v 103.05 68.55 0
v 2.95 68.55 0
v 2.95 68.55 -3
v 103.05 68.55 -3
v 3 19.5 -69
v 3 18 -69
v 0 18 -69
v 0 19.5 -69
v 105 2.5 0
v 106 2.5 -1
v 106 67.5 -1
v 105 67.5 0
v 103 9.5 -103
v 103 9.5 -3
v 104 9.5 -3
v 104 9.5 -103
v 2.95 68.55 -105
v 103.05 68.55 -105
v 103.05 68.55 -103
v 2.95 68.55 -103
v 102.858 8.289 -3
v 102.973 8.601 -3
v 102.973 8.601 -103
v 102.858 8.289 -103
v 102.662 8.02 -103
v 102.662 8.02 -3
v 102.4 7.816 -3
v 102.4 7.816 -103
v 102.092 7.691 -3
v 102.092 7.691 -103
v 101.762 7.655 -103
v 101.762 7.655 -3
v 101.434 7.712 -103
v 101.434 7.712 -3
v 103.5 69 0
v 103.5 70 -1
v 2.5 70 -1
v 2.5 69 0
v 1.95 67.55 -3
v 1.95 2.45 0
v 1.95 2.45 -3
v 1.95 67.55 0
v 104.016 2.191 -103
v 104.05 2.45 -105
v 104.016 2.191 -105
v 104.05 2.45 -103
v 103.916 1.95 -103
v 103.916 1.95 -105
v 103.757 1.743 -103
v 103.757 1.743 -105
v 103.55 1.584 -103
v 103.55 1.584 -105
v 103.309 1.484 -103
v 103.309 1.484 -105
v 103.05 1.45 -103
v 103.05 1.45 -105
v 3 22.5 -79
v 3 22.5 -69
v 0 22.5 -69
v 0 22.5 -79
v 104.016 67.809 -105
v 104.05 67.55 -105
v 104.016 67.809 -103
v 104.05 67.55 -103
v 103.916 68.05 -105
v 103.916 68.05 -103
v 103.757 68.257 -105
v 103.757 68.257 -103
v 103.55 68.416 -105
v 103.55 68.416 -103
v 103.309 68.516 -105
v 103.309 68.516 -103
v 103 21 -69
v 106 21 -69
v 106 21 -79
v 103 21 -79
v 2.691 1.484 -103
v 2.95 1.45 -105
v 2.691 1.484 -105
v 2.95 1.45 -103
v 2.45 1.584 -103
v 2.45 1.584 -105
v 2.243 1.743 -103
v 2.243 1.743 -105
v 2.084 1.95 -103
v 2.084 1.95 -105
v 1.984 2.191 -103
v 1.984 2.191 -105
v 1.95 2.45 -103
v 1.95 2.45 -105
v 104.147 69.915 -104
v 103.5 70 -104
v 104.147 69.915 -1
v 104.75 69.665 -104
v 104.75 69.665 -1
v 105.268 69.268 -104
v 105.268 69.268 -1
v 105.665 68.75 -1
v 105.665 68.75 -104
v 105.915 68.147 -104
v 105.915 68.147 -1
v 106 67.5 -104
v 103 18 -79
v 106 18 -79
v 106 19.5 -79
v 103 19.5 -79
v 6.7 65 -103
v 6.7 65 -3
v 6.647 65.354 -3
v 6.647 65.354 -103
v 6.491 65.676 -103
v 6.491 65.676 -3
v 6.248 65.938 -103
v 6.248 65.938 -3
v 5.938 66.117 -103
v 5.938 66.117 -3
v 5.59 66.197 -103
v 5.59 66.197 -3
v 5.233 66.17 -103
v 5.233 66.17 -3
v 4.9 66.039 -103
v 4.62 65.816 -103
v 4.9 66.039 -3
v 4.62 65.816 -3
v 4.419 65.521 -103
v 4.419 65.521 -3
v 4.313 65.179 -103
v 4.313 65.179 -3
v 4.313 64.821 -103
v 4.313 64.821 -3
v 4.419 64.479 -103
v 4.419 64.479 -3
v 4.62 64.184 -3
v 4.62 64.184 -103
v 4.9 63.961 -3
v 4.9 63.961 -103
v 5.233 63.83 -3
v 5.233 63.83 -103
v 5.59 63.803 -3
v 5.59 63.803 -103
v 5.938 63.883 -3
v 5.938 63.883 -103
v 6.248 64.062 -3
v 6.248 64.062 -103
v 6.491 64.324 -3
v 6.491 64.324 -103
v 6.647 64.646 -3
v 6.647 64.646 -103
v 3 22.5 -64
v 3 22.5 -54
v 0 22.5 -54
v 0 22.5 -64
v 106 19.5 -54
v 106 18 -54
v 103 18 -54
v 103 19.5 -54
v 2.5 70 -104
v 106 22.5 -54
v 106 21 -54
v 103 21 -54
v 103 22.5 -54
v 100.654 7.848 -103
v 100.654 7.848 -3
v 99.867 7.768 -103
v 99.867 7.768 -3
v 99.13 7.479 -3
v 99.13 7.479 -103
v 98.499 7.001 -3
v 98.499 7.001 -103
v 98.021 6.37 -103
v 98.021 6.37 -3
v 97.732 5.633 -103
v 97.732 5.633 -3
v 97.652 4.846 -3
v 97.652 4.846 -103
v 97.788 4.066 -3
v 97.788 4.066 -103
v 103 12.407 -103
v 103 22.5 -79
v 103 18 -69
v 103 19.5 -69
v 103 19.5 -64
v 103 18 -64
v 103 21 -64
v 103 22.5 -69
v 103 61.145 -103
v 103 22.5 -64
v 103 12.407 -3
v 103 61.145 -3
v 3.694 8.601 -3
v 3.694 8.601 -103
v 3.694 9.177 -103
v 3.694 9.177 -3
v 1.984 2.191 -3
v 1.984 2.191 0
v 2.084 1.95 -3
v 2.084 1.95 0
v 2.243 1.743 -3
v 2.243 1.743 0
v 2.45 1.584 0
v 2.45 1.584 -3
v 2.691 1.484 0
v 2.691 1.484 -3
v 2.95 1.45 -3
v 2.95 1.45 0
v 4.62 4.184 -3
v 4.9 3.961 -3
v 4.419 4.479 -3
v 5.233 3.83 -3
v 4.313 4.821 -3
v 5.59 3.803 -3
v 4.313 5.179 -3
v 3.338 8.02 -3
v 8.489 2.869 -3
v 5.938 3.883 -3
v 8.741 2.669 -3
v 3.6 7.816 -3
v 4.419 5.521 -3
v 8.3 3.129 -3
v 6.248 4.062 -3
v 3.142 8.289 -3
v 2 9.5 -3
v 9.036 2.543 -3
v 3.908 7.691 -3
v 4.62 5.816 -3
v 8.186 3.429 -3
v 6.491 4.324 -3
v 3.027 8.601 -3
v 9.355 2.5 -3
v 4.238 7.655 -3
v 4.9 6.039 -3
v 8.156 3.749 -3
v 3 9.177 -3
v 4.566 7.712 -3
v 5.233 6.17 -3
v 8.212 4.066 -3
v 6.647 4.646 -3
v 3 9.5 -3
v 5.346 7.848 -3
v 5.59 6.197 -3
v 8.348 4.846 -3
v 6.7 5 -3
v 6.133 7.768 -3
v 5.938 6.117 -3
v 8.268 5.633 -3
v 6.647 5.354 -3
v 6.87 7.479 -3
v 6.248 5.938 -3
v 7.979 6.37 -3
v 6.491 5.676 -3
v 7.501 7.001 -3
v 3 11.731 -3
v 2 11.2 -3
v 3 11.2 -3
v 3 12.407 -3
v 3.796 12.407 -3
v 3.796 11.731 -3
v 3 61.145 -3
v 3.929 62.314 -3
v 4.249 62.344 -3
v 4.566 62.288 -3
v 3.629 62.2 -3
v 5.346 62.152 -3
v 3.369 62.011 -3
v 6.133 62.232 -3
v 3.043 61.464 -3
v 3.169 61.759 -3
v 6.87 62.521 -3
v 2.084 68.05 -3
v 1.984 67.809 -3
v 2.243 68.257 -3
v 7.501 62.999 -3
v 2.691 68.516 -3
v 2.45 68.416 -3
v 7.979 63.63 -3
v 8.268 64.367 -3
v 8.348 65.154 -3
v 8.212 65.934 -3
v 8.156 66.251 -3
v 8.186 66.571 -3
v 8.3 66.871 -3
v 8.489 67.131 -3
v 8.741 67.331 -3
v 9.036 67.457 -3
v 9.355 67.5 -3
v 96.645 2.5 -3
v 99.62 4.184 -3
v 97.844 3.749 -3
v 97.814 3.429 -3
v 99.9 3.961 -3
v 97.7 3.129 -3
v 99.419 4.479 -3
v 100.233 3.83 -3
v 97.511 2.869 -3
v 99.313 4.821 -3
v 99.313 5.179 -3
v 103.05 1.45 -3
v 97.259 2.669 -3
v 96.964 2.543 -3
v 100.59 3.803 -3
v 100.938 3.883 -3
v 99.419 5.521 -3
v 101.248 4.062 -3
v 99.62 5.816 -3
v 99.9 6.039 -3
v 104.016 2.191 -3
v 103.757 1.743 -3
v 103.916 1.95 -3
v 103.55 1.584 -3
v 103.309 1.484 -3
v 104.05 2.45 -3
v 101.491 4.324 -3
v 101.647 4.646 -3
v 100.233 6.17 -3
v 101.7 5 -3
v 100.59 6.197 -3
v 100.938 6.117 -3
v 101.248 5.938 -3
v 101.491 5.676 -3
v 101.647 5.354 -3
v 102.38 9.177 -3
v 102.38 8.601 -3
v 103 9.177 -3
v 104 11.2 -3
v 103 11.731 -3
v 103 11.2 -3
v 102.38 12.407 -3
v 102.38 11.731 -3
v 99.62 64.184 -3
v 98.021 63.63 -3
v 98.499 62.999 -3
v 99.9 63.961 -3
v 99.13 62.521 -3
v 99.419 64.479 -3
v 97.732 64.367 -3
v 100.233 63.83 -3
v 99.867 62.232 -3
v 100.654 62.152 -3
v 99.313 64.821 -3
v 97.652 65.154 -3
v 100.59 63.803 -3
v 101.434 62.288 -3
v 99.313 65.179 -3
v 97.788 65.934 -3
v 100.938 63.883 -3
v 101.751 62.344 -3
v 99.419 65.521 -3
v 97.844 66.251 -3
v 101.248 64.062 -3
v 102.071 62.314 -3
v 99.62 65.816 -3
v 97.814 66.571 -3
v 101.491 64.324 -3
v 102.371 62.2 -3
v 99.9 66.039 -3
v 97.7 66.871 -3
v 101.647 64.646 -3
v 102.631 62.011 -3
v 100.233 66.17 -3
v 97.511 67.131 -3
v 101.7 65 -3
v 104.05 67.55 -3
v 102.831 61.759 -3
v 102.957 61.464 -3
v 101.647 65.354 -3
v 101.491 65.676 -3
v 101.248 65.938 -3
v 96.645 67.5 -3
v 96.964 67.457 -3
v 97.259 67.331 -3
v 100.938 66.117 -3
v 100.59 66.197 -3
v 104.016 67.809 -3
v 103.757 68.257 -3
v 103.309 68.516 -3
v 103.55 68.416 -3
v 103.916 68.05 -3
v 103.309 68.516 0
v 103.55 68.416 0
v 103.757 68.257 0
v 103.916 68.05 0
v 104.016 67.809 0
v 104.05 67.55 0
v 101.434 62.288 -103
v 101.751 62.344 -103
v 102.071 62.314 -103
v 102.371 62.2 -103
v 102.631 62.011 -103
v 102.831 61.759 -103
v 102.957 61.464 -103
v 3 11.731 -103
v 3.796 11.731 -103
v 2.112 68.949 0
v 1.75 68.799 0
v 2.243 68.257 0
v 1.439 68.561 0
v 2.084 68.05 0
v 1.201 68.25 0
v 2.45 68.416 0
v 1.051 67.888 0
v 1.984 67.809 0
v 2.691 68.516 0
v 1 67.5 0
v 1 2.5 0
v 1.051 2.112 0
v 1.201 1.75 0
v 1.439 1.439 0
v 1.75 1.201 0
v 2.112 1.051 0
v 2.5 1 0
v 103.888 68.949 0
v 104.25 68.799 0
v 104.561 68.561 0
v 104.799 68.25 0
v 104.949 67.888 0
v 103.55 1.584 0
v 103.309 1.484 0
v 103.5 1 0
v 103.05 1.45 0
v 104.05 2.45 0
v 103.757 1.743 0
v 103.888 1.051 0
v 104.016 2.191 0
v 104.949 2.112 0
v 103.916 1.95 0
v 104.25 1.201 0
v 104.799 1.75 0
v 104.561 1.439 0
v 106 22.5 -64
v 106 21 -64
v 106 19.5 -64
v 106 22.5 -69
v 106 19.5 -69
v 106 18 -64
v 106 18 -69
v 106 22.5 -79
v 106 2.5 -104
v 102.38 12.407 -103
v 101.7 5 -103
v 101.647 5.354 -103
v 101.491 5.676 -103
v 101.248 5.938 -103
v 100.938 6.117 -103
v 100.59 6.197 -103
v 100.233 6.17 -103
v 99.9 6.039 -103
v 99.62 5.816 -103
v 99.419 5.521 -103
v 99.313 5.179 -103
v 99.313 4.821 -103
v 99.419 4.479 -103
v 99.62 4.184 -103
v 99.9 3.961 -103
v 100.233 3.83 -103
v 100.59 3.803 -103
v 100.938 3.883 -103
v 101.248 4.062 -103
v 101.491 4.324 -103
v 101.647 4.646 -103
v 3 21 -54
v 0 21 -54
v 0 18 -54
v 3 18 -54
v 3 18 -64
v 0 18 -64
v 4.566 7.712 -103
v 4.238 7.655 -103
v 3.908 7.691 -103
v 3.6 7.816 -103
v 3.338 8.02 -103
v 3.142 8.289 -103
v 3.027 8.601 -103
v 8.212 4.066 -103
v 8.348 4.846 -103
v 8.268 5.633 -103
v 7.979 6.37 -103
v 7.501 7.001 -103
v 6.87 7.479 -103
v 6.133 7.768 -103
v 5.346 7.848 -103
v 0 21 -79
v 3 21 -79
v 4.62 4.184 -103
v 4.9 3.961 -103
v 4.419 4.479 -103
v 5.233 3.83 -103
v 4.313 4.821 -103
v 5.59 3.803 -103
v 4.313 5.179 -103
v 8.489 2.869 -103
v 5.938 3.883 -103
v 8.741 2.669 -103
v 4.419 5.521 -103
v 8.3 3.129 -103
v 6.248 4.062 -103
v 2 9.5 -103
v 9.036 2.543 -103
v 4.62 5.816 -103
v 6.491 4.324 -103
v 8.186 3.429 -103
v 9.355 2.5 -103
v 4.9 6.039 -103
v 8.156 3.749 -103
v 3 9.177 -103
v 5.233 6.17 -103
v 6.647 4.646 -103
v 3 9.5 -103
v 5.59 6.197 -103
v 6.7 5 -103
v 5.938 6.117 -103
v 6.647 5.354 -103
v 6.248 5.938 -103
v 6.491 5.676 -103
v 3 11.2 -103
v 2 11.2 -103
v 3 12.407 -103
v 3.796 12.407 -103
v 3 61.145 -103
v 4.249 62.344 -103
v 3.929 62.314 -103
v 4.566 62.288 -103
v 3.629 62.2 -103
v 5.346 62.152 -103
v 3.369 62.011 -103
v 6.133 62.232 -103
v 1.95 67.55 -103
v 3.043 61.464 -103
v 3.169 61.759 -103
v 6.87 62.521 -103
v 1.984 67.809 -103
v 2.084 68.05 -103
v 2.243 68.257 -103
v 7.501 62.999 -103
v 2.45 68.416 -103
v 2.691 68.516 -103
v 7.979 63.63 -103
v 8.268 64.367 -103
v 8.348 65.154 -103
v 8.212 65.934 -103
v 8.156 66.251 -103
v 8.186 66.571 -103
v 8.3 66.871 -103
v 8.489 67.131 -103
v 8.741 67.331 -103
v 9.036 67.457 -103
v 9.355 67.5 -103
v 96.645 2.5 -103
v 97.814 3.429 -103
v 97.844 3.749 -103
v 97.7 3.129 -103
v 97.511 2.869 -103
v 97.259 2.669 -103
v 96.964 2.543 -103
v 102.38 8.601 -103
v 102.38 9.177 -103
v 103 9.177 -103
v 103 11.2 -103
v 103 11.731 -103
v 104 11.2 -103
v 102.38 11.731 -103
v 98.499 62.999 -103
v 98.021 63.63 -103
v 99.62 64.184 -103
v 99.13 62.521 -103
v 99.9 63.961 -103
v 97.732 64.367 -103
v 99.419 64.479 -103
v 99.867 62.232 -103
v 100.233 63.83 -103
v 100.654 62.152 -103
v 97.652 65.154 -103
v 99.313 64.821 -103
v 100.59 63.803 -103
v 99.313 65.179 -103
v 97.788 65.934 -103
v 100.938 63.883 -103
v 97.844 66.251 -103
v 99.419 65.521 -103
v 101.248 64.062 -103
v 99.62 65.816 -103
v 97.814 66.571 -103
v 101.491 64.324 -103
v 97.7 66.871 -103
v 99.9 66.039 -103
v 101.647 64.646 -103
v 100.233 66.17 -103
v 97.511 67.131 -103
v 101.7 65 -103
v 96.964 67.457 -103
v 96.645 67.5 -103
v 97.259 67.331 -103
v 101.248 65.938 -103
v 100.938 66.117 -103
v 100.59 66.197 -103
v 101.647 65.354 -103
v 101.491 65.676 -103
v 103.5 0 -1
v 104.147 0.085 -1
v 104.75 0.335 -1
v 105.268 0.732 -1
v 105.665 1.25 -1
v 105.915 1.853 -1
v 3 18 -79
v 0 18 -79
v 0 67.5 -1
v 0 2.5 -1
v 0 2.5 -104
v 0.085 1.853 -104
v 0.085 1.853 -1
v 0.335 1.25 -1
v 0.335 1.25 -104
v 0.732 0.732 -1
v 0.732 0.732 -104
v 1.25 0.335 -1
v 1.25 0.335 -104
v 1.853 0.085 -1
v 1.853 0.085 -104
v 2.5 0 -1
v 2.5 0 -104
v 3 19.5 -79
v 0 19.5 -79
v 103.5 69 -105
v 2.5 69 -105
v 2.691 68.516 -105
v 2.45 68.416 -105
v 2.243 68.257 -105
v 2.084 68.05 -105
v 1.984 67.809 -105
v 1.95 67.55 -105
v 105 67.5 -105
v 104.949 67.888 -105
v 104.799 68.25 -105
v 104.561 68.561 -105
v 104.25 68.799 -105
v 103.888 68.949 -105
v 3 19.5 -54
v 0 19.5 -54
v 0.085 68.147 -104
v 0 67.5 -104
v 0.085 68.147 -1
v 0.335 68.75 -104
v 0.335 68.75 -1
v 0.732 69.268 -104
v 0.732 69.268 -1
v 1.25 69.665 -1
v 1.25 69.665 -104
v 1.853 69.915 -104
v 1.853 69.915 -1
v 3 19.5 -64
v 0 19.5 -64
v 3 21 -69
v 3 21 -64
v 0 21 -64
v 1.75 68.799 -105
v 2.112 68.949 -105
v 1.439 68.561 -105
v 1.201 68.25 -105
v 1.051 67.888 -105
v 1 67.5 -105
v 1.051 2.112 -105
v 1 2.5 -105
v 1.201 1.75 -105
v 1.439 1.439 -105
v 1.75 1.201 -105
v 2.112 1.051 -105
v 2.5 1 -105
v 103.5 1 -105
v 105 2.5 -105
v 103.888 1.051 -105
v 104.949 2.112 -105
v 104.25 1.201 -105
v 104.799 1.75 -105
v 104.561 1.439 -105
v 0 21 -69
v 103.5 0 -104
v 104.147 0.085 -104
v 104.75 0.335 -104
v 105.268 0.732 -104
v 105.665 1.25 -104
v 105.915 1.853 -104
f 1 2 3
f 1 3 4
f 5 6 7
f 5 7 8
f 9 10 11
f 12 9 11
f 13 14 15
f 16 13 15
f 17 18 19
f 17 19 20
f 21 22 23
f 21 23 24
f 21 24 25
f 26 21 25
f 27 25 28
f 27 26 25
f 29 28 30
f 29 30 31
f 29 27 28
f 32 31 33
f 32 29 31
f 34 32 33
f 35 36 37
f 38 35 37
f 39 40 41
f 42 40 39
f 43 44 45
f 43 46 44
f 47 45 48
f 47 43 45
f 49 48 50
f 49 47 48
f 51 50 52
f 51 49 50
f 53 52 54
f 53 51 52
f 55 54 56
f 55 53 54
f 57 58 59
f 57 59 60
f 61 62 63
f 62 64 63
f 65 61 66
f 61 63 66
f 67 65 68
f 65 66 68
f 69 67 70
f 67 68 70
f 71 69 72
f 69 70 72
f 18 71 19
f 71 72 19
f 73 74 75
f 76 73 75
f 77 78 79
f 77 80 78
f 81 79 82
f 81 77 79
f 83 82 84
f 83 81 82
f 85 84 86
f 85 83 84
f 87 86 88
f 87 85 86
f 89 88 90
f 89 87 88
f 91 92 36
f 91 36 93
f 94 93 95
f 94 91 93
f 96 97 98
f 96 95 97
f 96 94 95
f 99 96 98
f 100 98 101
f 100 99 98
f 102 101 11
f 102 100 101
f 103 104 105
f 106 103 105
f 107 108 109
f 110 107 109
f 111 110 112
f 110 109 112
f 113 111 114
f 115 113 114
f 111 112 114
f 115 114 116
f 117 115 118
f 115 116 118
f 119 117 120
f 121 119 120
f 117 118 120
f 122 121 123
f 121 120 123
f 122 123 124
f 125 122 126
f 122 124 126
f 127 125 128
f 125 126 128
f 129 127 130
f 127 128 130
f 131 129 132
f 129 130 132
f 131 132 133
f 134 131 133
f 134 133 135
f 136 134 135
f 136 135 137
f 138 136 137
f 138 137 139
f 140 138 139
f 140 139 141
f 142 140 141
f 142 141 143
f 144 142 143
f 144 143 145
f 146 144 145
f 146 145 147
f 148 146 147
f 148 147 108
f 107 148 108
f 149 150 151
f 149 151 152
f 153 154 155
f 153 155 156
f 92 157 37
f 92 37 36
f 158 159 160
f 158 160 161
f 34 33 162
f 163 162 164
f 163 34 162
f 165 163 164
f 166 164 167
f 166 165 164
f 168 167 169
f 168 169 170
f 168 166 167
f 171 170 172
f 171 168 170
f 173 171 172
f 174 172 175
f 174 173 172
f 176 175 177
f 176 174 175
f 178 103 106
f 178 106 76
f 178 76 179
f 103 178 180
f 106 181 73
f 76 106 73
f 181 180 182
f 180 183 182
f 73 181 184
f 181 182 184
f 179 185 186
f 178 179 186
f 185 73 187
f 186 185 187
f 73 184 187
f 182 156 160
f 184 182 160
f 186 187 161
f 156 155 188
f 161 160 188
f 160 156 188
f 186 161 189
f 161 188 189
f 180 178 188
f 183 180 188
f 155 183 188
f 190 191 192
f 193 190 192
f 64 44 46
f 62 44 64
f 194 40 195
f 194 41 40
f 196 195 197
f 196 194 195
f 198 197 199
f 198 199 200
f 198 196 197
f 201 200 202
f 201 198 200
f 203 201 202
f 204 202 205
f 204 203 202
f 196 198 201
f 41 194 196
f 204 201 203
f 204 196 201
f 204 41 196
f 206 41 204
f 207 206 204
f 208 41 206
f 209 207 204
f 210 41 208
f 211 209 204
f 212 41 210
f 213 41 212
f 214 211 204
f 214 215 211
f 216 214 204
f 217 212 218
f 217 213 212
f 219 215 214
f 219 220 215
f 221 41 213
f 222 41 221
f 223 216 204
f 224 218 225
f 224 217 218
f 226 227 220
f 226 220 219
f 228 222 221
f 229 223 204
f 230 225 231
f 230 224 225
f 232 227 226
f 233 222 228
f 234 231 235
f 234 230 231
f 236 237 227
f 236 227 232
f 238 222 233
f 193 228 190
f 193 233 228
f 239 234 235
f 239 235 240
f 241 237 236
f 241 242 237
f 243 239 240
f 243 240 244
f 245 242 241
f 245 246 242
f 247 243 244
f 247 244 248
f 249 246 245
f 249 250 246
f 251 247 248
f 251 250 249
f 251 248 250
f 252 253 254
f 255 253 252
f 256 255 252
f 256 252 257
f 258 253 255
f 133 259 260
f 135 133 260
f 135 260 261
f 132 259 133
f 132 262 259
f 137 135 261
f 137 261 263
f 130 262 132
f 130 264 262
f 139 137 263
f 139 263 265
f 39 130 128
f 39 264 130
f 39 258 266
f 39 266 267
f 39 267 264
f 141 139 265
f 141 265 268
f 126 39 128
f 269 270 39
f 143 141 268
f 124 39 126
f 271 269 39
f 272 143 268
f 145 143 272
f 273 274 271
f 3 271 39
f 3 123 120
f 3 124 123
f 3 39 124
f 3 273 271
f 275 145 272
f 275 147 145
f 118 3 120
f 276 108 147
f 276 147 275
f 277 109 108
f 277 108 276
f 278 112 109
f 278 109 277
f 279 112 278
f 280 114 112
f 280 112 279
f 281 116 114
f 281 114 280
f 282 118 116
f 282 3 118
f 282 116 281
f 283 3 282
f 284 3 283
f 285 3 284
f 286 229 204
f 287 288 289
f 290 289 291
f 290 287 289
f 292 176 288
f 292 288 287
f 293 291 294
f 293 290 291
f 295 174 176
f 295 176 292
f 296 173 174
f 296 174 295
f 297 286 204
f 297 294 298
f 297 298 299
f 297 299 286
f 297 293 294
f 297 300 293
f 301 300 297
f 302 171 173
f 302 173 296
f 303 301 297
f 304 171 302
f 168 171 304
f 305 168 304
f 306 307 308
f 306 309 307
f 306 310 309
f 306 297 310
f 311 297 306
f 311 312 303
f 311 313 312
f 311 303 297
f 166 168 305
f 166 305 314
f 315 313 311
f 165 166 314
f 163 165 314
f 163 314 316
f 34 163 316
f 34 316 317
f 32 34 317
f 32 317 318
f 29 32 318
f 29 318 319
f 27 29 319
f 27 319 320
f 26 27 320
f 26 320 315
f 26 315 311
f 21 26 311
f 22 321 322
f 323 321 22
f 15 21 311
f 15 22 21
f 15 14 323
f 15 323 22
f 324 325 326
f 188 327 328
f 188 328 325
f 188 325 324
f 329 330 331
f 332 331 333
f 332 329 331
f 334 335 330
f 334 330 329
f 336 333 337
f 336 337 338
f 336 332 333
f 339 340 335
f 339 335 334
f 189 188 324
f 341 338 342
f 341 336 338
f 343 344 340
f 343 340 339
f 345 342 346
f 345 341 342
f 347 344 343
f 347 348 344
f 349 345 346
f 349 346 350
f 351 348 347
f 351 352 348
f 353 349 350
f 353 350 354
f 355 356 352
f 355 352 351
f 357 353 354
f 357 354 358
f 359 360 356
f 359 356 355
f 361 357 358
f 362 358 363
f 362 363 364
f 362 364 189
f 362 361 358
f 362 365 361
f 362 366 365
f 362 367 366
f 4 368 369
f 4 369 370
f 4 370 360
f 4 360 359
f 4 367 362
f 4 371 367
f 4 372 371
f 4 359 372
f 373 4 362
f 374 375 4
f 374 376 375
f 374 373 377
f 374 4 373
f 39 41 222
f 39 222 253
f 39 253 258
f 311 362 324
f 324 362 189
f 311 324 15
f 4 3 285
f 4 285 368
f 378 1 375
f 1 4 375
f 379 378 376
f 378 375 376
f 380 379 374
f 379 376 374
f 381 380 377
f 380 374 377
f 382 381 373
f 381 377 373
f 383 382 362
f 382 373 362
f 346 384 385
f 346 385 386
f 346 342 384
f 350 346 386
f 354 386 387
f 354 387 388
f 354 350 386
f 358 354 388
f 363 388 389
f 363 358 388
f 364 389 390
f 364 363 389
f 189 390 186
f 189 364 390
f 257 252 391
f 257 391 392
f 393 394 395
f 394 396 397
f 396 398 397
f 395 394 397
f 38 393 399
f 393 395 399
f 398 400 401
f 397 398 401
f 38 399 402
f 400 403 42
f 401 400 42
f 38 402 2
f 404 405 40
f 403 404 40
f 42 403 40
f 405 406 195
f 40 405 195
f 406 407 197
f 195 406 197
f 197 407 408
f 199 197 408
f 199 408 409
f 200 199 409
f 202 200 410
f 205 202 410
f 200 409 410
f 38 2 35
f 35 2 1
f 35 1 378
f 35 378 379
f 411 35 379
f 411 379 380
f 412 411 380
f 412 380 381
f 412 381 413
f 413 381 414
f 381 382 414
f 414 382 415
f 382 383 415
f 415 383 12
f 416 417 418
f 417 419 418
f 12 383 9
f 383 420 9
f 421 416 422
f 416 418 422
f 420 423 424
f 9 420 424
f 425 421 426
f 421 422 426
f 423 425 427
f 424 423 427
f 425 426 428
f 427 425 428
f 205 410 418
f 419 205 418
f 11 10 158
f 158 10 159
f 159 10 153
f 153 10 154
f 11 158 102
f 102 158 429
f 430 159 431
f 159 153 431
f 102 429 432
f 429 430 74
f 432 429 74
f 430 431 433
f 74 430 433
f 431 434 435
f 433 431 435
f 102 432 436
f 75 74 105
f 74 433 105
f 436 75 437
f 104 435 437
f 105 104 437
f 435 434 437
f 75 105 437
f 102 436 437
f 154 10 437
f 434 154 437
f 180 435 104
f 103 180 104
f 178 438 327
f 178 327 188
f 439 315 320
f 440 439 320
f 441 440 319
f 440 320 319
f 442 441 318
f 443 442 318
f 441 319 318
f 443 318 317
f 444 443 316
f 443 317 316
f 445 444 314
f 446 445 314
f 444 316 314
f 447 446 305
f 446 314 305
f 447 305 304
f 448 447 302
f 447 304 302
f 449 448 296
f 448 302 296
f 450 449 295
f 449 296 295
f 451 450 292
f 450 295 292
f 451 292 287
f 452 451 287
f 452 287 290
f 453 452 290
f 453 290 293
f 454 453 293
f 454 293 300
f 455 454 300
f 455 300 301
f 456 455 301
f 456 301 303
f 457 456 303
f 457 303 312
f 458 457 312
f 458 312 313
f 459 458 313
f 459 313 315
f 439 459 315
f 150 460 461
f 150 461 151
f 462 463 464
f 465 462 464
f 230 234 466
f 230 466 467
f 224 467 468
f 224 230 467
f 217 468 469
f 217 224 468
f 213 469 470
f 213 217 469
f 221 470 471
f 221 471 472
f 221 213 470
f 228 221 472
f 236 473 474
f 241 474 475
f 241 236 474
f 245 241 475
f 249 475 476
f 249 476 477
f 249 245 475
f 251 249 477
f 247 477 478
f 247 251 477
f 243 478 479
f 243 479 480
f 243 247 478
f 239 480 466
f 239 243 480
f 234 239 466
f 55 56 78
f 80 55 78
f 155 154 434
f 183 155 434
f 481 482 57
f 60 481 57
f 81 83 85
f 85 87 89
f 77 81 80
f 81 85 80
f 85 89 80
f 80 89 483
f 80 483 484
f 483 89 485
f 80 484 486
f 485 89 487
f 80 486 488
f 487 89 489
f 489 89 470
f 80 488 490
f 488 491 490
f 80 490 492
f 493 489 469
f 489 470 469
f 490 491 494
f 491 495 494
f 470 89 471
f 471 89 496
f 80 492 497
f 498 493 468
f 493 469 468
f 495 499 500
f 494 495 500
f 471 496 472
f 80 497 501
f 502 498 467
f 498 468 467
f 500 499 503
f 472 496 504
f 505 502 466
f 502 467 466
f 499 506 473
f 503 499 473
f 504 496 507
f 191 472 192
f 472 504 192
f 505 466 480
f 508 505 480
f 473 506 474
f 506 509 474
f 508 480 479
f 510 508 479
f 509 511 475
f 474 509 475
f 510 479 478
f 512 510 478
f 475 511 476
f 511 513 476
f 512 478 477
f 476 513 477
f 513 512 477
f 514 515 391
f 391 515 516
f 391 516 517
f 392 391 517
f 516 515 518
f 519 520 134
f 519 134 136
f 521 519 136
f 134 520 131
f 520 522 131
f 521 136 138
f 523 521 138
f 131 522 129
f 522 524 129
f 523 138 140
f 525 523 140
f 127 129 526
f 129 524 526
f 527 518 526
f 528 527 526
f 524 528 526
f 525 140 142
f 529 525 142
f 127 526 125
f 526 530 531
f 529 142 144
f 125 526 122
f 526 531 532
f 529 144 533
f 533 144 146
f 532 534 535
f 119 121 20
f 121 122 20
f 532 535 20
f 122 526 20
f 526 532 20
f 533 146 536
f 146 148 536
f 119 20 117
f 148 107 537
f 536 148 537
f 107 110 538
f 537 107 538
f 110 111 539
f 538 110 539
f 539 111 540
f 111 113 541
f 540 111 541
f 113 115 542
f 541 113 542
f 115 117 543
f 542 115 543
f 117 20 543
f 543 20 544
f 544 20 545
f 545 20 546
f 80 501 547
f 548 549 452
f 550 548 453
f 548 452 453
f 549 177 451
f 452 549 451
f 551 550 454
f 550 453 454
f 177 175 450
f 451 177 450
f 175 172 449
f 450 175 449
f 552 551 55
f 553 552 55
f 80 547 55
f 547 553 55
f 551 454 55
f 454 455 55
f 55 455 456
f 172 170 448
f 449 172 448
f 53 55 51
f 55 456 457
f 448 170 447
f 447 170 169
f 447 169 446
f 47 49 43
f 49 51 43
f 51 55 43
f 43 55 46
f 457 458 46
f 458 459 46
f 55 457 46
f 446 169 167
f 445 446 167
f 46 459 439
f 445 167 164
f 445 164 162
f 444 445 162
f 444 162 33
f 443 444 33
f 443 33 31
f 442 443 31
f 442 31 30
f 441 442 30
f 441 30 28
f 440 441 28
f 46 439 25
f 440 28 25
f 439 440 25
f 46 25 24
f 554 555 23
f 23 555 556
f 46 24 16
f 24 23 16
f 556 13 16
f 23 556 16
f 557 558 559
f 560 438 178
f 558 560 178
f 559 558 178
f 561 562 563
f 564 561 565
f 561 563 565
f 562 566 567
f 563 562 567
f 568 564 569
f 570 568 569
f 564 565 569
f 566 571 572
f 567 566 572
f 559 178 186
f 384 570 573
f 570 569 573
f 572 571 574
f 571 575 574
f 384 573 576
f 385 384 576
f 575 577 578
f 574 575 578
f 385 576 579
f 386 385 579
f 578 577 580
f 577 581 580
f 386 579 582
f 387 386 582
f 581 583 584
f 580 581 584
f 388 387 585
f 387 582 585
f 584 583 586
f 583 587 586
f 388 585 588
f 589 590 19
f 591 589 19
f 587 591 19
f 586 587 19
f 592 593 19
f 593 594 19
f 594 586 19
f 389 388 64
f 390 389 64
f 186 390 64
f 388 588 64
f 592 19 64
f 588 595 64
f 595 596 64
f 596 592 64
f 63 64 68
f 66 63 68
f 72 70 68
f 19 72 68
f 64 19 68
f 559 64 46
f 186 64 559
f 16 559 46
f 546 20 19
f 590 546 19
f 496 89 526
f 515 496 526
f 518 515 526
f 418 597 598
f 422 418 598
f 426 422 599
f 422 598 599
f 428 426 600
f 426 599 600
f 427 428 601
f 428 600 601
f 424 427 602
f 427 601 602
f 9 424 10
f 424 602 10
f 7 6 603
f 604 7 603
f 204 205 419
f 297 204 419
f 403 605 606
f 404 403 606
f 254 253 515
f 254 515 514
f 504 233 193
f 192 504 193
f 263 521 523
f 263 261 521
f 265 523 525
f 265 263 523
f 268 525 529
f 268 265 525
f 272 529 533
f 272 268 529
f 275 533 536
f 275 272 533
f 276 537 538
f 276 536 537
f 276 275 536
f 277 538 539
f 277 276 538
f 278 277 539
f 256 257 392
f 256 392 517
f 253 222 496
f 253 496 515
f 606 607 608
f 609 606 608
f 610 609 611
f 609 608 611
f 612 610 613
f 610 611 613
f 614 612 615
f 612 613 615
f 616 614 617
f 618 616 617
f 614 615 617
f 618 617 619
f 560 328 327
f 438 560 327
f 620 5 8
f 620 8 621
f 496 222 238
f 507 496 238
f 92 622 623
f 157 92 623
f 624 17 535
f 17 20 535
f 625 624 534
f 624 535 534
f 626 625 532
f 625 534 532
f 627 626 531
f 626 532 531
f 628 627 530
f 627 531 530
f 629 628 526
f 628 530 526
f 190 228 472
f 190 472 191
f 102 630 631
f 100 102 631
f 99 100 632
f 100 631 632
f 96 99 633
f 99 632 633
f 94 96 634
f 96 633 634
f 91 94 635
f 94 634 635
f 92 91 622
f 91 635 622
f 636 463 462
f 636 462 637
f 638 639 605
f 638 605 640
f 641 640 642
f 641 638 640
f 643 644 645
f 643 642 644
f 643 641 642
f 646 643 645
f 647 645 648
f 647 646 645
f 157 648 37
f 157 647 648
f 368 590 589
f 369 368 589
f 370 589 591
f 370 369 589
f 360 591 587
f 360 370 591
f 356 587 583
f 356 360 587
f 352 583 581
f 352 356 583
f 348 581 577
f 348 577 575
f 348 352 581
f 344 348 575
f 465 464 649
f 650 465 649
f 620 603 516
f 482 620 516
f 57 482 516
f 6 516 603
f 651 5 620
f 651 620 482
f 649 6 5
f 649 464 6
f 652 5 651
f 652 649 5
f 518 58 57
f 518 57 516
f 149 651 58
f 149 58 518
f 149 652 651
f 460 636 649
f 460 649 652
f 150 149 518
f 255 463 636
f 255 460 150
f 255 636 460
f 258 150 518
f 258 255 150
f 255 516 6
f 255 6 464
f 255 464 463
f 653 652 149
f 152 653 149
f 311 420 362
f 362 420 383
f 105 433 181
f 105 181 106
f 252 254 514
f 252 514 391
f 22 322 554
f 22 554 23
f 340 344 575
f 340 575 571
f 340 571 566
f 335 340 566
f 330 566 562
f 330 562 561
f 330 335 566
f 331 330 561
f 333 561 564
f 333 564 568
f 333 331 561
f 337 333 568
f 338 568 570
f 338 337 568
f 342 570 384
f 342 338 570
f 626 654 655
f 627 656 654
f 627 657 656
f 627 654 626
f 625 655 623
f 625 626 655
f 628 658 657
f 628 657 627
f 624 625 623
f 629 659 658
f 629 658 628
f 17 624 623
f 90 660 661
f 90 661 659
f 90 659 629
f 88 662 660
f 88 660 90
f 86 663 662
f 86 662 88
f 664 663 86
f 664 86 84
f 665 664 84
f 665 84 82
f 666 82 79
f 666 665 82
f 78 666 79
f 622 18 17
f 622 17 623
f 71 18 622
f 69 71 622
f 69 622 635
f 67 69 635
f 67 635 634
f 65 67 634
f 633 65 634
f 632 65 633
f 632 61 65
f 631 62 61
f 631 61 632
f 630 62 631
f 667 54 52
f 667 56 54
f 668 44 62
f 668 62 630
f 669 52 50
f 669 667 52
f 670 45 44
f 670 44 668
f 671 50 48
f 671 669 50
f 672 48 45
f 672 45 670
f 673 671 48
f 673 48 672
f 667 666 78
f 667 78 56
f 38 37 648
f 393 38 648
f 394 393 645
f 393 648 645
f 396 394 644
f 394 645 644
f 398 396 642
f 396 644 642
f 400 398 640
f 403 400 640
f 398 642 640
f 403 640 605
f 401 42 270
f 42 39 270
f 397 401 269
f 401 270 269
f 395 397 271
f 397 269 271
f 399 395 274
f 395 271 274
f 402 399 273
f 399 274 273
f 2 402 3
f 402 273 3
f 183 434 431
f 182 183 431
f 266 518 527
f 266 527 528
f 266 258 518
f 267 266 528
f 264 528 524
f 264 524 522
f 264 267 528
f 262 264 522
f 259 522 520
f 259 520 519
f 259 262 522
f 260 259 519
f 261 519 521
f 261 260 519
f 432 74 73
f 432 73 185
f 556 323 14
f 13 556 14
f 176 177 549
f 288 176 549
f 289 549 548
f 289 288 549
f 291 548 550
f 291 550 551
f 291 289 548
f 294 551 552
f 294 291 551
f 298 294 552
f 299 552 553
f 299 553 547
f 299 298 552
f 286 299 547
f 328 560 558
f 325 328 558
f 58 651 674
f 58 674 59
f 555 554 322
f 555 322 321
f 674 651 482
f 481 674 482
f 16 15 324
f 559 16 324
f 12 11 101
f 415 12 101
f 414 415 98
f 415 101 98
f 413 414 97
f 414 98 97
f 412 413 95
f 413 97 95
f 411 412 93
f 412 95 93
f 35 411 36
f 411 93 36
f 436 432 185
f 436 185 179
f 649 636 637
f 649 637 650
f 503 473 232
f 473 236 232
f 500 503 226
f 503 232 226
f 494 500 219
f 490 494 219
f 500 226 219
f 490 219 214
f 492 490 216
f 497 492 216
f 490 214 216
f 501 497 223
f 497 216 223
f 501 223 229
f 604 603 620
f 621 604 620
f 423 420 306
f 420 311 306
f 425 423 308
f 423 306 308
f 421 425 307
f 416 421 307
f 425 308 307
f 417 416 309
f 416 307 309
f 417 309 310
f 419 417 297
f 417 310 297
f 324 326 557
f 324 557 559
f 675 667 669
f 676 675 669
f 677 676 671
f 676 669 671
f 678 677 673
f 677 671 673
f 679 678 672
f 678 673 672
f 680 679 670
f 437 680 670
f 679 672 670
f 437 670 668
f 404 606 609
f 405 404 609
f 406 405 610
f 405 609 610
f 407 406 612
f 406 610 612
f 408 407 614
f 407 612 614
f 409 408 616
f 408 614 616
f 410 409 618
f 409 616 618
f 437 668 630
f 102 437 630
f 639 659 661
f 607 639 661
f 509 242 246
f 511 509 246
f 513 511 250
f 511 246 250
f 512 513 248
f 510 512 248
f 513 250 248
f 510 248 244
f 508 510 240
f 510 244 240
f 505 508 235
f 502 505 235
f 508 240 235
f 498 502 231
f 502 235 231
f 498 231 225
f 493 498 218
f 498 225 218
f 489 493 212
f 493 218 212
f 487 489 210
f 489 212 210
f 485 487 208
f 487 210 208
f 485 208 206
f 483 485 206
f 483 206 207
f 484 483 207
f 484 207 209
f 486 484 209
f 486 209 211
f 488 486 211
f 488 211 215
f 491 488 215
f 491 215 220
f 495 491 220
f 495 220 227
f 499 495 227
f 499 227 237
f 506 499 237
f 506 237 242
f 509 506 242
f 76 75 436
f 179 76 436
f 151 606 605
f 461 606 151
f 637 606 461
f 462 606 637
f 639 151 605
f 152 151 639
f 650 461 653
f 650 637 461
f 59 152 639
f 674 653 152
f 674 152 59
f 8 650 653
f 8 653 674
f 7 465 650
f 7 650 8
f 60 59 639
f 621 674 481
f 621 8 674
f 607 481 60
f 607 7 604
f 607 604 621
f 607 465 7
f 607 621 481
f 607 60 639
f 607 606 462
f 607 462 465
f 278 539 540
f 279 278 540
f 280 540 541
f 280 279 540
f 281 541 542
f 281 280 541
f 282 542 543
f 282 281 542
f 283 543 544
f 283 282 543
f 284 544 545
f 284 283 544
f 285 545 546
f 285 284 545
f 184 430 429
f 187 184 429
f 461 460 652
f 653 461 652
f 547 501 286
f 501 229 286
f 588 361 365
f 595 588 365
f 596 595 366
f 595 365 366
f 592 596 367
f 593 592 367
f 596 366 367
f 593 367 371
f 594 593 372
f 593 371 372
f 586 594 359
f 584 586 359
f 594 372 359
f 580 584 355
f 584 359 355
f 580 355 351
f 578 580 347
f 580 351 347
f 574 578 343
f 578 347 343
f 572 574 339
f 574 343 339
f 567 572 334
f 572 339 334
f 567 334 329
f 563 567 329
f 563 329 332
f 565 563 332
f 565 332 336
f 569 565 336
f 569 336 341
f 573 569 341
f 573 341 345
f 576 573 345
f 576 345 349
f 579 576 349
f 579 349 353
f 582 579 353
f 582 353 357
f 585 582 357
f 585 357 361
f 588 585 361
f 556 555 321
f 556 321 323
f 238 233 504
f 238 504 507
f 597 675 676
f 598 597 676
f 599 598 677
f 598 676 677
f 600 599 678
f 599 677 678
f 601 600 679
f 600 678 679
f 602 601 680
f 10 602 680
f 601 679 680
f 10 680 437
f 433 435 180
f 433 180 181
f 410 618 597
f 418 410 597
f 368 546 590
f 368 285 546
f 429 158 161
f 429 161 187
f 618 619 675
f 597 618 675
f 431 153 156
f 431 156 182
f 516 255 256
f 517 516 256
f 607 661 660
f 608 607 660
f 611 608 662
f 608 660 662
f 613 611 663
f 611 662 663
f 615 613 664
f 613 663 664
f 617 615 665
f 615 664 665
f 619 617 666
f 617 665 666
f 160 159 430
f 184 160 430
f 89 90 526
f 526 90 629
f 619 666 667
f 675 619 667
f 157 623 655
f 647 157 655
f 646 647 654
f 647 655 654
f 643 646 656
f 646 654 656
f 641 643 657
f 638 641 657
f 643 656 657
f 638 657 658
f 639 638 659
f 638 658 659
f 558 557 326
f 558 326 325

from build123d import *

# Parameters (mm, degrees)
SKETCH_3_W          = 106
SKETCH_3_H          = 105
EXTRUDE_1_DEPTH     = 70
SKETCH_4_W          = 100
SKETCH_4_H          = 65
CUT_EXTRUDE_1_DEPTH = 165.805946495
FILLET_2_R          = 2.5
FILLET_3_R          = 2.5
CHAMFER_1_SIZE      = 1
SKETCH_5_W          = 2.616772355
SKETCH_5_H          = 1.7
CUT_EXTRUDE_2_DEPTH = 165.805946495
SKETCH_7_W          = 102.1
SKETCH_7_H          = 67.1
CUT_EXTRUDE_3_DEPTH = 3
FILLET_4_R          = 1
SKETCH_8_W          = 102.1
SKETCH_8_H          = 67.1
CUT_EXTRUDE_4_DEPTH = 2
FILLET_5_R          = 1
SKETCH_9_R          = 2.9
EXTRUDE_2_DEPTH     = 100
FILLET_6_R          = 1.2
SKETCH_10_R         = 1.2
CUT_EXTRUDE_5_DEPTH = 163.911018657
SKETCH_11_W         = 10
SKETCH_11_H         = 1.5
CUT_EXTRUDE_6_DEPTH = 165.805946495
SKETCH_13_W         = 0.619617199
SKETCH_13_H         = 0.675027666
SKETCH_13_H_2       = 0.576636166
SKETCH_13_W_2       = 0.693795217
SKETCH_13_W_3       = 0.795649679
EXTRUDE_3_DEPTH     = 100


with BuildPart() as part:
    # 草图3 → 凸台-拉伸1 (new body)
    with BuildSketch(Plane(origin=(0, 0, 0), x_dir=(1, 0, 0), z_dir=(0, 1, 0))):
        with Locations((53, 52.5)):
            Rectangle(SKETCH_3_W, SKETCH_3_H)
    extrude(amount=EXTRUDE_1_DEPTH)

    # 草图4 → 切除-拉伸1 (cut, through all)
    with BuildSketch(Plane.XY):
        with Locations((53, 35)):
            Rectangle(SKETCH_4_W, SKETCH_4_H)
    extrude(amount=-CUT_EXTRUDE_1_DEPTH, mode=Mode.SUBTRACT)

    # 圆角2
    fillet_2_edges = [part.edges().sort_by_distance(p)[0] for p in [
        (106, 70, -52.5),
        (0, 70, -52.5),
        (106, 0, -52.5),
        (0, 0, -52.5),
    ]]
    fillet(fillet_2_edges, radius=FILLET_2_R)

    # 圆角3
    fillet_3_edges = [part.edges().sort_by_distance(p)[0] for p in [
        (3, 2.5, -52.5),
        (3, 67.5, -52.5),
        (103, 67.5, -52.5),
        (103, 2.5, -52.5),
    ]]
    fillet(fillet_3_edges, radius=FILLET_3_R)

    # 倒角1
    chamfer_1_edges = [part.edges().sort_by_distance(p)[0] for p in [
        (106, 35, -105),
        (106, 35, 0),
        (53, 0, -105),
        (0, 35, -105),
        (53, 70, -105),
        (0.732233047, 69.267766953, -105),
        (105.267766953, 69.267766953, -105),
        (0.732233047, 0.732233047, -105),
        (105.267766953, 0.732233047, -105),
        (53, 0, 0),
        (53, 70, 0),
        (0, 35, 0),
        (0.732233047, 69.267766953, 0),
        (105.267766953, 69.267766953, 0),
        (0.732233047, 0.732233047, 0),
        (105.267766953, 0.732233047, 0),
    ]]
    chamfer(chamfer_1_edges, length=CHAMFER_1_SIZE)

    # 草图5 → 切除-拉伸2 (cut, through all)
    with BuildSketch(Plane.XY):
        with Locations((3.308386178, 10.35)):
            Rectangle(SKETCH_5_W, SKETCH_5_H)
        with Locations((102.691613823, 10.35)):
            Rectangle(SKETCH_5_W, SKETCH_5_H)
    extrude(amount=-CUT_EXTRUDE_2_DEPTH, mode=Mode.SUBTRACT)

    # 草图7 → 切除-拉伸3 (cut)
    with BuildSketch(Plane.XY):
        with Locations((53, 35)):
            Rectangle(SKETCH_7_W, SKETCH_7_H)
    extrude(amount=-CUT_EXTRUDE_3_DEPTH, mode=Mode.SUBTRACT)

    # 圆角4
    fillet_4_edges = [part.edges().sort_by_distance(p)[0] for p in [
        (1.95, 1.45, -1.5),
        (1.95, 68.55, -1.5),
        (104.05, 68.55, -1.5),
        (104.05, 1.45, -1.5),
    ]]
    fillet(fillet_4_edges, radius=FILLET_4_R)

    # 草图8 → 切除-拉伸4 (cut)
    with BuildSketch(Plane(origin=(0, 0, -105), x_dir=(-1, 0, 0), z_dir=(0, 0, -1))):
        with Locations((-53, 35)):
            Rectangle(SKETCH_8_W, SKETCH_8_H)
    extrude(amount=-CUT_EXTRUDE_4_DEPTH, mode=Mode.SUBTRACT)

    # 圆角5
    fillet_5_edges = [part.edges().sort_by_distance(p)[0] for p in [
        (104.05, 1.45, -104),
        (104.05, 68.55, -104),
        (1.95, 68.55, -104),
        (1.95, 1.45, -104),
    ]]
    fillet(fillet_5_edges, radius=FILLET_5_R)

    # 草图9 → 凸台-拉伸2 (add)
    with BuildSketch(Plane.XY.offset(-3)):
        with Locations((5.45, 4.95)):
            Circle(SKETCH_9_R)
        with Locations((100.55, 4.95)):
            Circle(SKETCH_9_R)
        with Locations((100.55, 65.05)):
            Circle(SKETCH_9_R)
        with Locations((5.45, 65.05)):
            Circle(SKETCH_9_R)
    extrude(amount=-EXTRUDE_2_DEPTH)

    # 圆角6
    fillet_6_edges = [part.edges().sort_by_distance(p)[0] for p in [
        (3, 6.501612065, -53),
        (7.001612065, 2.5, -53),
        (103, 6.501612065, -53),
        (98.998387935, 2.5, -53),
        (98.998387935, 67.5, -53),
        (103, 63.498387935, -53),
        (3, 63.498387935, -53),
        (7.001612065, 67.5, -53),
    ]]
    fillet(fillet_6_edges, radius=FILLET_6_R)

    # 草图10 → 切除-拉伸5 (cut, through all)
    with BuildSketch(Plane.XY.offset(-3)):
        with Locations((5.5, 5)):
            Circle(SKETCH_10_R)
        with Locations((100.5, 65)):
            Circle(SKETCH_10_R)
        with Locations((5.5, 65)):
            Circle(SKETCH_10_R)
        with Locations((100.5, 5)):
            Circle(SKETCH_10_R)
    extrude(amount=-CUT_EXTRUDE_5_DEPTH, mode=Mode.SUBTRACT)

    # 草图11 → 切除-拉伸6 (cut, through all)
    with BuildSketch(Plane(origin=(106, 0, 0), x_dir=(0, 0, -1), z_dir=(1, 0, 0))):
        with Locations((74, 18.75)):
            Rectangle(SKETCH_11_W, SKETCH_11_H)
        with Locations((74, 21.75)):
            Rectangle(SKETCH_11_W, SKETCH_11_H)
        with Locations((59, 18.75)):
            Rectangle(SKETCH_11_W, SKETCH_11_H)
        with Locations((59, 21.75)):
            Rectangle(SKETCH_11_W, SKETCH_11_H)
    extrude(amount=-CUT_EXTRUDE_6_DEPTH, mode=Mode.SUBTRACT)

    # 草图13 → 凸台-拉伸3 (add)
    with BuildSketch(Plane.XY.offset(-3)):
        with Locations((102.6901914, 12.069011797)):
            Rectangle(SKETCH_13_W, SKETCH_13_H)
        with Locations((102.6901914, 8.889084283)):
            Rectangle(SKETCH_13_W, SKETCH_13_H_2)
        with Locations((3.346897608, 8.889084283)):
            Rectangle(SKETCH_13_W_2, SKETCH_13_H_2)
        with Locations((3.39782484, 12.069011797)):
            Rectangle(SKETCH_13_W_3, SKETCH_13_H)
    extrude(amount=-EXTRUDE_3_DEPTH)


solid = part.part
